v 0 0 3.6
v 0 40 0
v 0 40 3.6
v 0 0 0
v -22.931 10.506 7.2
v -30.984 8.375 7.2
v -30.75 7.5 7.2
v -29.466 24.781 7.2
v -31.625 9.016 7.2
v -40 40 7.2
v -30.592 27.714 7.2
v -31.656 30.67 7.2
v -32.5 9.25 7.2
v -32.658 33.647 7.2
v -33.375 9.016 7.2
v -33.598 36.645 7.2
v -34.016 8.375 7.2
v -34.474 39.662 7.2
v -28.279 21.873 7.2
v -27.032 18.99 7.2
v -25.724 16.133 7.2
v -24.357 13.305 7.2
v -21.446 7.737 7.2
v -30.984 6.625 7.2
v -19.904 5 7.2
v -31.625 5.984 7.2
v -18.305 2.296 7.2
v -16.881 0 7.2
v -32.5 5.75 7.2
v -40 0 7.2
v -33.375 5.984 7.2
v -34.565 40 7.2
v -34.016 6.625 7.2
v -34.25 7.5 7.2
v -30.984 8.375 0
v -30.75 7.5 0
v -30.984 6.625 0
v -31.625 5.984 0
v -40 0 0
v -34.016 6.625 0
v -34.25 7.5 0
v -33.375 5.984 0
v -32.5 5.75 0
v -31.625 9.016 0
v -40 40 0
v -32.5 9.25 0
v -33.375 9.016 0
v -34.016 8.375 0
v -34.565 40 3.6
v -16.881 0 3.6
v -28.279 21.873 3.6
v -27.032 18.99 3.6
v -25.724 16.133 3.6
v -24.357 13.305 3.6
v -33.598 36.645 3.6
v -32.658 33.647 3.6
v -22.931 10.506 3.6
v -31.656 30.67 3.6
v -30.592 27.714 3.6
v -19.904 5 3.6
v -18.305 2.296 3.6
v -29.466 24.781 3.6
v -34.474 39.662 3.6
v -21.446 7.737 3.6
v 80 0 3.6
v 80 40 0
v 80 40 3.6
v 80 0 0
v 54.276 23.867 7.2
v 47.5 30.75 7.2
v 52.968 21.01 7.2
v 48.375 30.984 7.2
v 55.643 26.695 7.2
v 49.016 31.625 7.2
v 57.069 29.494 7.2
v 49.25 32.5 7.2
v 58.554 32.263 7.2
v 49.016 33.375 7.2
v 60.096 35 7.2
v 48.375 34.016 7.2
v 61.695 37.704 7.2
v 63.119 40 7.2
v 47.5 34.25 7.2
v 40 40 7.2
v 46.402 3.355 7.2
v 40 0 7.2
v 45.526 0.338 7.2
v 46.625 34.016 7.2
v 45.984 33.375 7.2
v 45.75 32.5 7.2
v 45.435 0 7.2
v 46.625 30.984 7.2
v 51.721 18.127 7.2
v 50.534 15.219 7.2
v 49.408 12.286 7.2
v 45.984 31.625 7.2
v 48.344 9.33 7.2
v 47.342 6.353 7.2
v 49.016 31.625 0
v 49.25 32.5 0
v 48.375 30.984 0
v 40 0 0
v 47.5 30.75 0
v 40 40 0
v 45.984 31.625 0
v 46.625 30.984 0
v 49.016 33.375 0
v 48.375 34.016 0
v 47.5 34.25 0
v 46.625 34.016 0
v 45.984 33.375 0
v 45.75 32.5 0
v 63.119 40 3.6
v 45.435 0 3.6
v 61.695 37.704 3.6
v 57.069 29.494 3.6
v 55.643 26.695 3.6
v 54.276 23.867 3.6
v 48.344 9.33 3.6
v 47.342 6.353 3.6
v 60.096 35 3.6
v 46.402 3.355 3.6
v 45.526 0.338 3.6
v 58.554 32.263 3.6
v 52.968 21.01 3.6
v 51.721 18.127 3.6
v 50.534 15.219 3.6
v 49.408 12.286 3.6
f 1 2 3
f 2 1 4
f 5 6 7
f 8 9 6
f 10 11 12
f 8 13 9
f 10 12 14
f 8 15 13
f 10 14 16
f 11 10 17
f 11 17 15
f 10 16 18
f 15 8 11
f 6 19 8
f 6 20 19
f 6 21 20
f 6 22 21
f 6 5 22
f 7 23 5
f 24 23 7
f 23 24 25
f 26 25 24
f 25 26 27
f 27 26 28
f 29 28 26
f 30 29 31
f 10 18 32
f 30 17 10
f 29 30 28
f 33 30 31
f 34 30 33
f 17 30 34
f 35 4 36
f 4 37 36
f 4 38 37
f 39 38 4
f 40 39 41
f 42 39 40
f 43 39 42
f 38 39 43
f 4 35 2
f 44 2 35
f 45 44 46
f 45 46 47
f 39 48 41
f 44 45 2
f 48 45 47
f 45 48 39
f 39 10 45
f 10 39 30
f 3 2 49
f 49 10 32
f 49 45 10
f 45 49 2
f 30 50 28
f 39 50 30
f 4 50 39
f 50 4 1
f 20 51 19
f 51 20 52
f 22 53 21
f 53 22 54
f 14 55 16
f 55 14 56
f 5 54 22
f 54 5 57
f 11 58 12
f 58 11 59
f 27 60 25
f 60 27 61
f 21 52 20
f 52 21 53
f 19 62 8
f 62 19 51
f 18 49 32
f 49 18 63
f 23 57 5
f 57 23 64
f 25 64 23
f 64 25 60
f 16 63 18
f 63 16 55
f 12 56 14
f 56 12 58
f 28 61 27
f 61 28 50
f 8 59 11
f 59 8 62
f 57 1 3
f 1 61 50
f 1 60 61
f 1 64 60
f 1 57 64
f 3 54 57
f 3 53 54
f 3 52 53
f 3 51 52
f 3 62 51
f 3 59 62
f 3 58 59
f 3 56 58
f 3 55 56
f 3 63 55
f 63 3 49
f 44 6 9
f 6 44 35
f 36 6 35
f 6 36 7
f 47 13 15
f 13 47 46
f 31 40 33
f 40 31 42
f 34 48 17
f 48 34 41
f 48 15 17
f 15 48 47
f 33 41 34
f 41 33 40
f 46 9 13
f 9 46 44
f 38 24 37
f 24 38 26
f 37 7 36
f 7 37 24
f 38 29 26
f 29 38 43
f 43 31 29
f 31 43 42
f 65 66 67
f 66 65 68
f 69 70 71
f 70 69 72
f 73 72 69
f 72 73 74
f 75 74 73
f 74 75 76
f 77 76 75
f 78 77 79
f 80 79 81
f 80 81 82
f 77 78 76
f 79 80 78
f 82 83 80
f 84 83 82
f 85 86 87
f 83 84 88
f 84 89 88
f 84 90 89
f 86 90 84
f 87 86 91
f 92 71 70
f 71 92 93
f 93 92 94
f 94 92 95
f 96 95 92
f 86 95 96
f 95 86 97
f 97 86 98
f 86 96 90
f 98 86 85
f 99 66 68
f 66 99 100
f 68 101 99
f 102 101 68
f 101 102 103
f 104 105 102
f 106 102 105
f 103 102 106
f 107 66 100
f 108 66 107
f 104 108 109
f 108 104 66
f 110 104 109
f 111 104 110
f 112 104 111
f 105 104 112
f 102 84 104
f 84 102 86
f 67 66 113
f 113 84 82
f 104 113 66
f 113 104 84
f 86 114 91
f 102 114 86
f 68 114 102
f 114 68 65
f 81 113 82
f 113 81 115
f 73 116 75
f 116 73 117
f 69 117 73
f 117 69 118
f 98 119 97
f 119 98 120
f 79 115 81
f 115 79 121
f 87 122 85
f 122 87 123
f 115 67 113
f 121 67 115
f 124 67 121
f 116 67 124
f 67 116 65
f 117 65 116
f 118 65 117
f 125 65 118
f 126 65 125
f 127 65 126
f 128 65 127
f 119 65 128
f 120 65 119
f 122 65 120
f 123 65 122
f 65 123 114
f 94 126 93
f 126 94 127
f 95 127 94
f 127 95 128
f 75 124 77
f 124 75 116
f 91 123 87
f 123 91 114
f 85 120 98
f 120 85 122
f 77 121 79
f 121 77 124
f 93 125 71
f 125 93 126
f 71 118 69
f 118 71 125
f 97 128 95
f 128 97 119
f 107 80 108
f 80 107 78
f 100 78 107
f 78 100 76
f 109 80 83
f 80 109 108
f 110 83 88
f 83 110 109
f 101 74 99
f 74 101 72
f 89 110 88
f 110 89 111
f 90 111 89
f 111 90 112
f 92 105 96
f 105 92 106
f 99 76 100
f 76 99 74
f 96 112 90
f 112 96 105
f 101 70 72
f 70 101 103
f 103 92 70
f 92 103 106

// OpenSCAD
// file: ../include/configuration.scad
// Increase this if your slicer or printer make holes too tight.
extra_radius = 0.125;

// OD = outside diameter, corner to corner.
m3_nut_od = 6.1;
m3_nut_radius = m3_nut_od/2 + 0.2 + extra_radius;
m3_washer_radius = 3.5 + extra_radius;

// Major diameter of metric 3mm thread.
m3_major = 2.85;
m3_radius = m3_major/2 + extra_radius;
m3_wide_radius = m3_major/2 + extra_radius + 0.2;

// Major diameter of metric 5mm thread.
m5_major = 4.85;
m5_radius = m5_major/2 + extra_radius;
m5_wide_radius = m5_major/2 + extra_radius + 0.2;

// NEMA17 stepper motors.
motor_shaft_diameter = 5;
motor_shaft_radius = motor_shaft_diameter/2 + extra_radius;

// Frame brackets. M3x8mm screws work best with 3.6 mm brackets.
thickness = 3.6;

// OpenBeam or Misumi. Currently only 15x15 mm, but there is a plan
// to make models more parametric and allow 20x20 mm in the future.
extrusion = 15;

// Placement for the NEMA17 stepper motors.
motor_offset = 44;
motor_length = 47;

// Horizontal extrusion size
frame_base_size = 420;
// main file
// Mounting tabs for glass build bed without heated bed
// Need 1 left and 1 right for each face of the base triangle

include <../include/configuration.scad>;

beddiameter = 300;
screw_offset = extrusion/2;
support_size = 40;
screw_tol=.125;

module glass_support_left()
{
	difference()
	{
		// Support plate
		cube([support_size, support_size, thickness*2]);
		// Remove area for glass bed to rest
		translate([beddiameter/2,support_size*2,thickness]) cylinder(r=beddiameter/2, h=thickness, $fn=beddiameter);
		// Make first mounting hole
		translate([screw_offset, screw_offset, 0]) cylinder(r=m3_wide_radius, h=thickness*2, $fn=12);
	}
}

module glass_support_right()
{
	difference()
	{
		// Support plate
		cube([support_size, support_size, thickness*2]);
		// Remove area for glass bed to rest
		translate([beddiameter/2,-(support_size),thickness]) cylinder(r=beddiameter/2, h=thickness, $fn=beddiameter);
		// Make first mounting hole
		translate([screw_offset, support_size - screw_offset, 0]) cylinder(r=m3_wide_radius, h=thickness*2, $fn=12);
	}
}

translate([-support_size,0,0]) glass_support_left();
translate([support_size,0,0]) glass_support_right();
